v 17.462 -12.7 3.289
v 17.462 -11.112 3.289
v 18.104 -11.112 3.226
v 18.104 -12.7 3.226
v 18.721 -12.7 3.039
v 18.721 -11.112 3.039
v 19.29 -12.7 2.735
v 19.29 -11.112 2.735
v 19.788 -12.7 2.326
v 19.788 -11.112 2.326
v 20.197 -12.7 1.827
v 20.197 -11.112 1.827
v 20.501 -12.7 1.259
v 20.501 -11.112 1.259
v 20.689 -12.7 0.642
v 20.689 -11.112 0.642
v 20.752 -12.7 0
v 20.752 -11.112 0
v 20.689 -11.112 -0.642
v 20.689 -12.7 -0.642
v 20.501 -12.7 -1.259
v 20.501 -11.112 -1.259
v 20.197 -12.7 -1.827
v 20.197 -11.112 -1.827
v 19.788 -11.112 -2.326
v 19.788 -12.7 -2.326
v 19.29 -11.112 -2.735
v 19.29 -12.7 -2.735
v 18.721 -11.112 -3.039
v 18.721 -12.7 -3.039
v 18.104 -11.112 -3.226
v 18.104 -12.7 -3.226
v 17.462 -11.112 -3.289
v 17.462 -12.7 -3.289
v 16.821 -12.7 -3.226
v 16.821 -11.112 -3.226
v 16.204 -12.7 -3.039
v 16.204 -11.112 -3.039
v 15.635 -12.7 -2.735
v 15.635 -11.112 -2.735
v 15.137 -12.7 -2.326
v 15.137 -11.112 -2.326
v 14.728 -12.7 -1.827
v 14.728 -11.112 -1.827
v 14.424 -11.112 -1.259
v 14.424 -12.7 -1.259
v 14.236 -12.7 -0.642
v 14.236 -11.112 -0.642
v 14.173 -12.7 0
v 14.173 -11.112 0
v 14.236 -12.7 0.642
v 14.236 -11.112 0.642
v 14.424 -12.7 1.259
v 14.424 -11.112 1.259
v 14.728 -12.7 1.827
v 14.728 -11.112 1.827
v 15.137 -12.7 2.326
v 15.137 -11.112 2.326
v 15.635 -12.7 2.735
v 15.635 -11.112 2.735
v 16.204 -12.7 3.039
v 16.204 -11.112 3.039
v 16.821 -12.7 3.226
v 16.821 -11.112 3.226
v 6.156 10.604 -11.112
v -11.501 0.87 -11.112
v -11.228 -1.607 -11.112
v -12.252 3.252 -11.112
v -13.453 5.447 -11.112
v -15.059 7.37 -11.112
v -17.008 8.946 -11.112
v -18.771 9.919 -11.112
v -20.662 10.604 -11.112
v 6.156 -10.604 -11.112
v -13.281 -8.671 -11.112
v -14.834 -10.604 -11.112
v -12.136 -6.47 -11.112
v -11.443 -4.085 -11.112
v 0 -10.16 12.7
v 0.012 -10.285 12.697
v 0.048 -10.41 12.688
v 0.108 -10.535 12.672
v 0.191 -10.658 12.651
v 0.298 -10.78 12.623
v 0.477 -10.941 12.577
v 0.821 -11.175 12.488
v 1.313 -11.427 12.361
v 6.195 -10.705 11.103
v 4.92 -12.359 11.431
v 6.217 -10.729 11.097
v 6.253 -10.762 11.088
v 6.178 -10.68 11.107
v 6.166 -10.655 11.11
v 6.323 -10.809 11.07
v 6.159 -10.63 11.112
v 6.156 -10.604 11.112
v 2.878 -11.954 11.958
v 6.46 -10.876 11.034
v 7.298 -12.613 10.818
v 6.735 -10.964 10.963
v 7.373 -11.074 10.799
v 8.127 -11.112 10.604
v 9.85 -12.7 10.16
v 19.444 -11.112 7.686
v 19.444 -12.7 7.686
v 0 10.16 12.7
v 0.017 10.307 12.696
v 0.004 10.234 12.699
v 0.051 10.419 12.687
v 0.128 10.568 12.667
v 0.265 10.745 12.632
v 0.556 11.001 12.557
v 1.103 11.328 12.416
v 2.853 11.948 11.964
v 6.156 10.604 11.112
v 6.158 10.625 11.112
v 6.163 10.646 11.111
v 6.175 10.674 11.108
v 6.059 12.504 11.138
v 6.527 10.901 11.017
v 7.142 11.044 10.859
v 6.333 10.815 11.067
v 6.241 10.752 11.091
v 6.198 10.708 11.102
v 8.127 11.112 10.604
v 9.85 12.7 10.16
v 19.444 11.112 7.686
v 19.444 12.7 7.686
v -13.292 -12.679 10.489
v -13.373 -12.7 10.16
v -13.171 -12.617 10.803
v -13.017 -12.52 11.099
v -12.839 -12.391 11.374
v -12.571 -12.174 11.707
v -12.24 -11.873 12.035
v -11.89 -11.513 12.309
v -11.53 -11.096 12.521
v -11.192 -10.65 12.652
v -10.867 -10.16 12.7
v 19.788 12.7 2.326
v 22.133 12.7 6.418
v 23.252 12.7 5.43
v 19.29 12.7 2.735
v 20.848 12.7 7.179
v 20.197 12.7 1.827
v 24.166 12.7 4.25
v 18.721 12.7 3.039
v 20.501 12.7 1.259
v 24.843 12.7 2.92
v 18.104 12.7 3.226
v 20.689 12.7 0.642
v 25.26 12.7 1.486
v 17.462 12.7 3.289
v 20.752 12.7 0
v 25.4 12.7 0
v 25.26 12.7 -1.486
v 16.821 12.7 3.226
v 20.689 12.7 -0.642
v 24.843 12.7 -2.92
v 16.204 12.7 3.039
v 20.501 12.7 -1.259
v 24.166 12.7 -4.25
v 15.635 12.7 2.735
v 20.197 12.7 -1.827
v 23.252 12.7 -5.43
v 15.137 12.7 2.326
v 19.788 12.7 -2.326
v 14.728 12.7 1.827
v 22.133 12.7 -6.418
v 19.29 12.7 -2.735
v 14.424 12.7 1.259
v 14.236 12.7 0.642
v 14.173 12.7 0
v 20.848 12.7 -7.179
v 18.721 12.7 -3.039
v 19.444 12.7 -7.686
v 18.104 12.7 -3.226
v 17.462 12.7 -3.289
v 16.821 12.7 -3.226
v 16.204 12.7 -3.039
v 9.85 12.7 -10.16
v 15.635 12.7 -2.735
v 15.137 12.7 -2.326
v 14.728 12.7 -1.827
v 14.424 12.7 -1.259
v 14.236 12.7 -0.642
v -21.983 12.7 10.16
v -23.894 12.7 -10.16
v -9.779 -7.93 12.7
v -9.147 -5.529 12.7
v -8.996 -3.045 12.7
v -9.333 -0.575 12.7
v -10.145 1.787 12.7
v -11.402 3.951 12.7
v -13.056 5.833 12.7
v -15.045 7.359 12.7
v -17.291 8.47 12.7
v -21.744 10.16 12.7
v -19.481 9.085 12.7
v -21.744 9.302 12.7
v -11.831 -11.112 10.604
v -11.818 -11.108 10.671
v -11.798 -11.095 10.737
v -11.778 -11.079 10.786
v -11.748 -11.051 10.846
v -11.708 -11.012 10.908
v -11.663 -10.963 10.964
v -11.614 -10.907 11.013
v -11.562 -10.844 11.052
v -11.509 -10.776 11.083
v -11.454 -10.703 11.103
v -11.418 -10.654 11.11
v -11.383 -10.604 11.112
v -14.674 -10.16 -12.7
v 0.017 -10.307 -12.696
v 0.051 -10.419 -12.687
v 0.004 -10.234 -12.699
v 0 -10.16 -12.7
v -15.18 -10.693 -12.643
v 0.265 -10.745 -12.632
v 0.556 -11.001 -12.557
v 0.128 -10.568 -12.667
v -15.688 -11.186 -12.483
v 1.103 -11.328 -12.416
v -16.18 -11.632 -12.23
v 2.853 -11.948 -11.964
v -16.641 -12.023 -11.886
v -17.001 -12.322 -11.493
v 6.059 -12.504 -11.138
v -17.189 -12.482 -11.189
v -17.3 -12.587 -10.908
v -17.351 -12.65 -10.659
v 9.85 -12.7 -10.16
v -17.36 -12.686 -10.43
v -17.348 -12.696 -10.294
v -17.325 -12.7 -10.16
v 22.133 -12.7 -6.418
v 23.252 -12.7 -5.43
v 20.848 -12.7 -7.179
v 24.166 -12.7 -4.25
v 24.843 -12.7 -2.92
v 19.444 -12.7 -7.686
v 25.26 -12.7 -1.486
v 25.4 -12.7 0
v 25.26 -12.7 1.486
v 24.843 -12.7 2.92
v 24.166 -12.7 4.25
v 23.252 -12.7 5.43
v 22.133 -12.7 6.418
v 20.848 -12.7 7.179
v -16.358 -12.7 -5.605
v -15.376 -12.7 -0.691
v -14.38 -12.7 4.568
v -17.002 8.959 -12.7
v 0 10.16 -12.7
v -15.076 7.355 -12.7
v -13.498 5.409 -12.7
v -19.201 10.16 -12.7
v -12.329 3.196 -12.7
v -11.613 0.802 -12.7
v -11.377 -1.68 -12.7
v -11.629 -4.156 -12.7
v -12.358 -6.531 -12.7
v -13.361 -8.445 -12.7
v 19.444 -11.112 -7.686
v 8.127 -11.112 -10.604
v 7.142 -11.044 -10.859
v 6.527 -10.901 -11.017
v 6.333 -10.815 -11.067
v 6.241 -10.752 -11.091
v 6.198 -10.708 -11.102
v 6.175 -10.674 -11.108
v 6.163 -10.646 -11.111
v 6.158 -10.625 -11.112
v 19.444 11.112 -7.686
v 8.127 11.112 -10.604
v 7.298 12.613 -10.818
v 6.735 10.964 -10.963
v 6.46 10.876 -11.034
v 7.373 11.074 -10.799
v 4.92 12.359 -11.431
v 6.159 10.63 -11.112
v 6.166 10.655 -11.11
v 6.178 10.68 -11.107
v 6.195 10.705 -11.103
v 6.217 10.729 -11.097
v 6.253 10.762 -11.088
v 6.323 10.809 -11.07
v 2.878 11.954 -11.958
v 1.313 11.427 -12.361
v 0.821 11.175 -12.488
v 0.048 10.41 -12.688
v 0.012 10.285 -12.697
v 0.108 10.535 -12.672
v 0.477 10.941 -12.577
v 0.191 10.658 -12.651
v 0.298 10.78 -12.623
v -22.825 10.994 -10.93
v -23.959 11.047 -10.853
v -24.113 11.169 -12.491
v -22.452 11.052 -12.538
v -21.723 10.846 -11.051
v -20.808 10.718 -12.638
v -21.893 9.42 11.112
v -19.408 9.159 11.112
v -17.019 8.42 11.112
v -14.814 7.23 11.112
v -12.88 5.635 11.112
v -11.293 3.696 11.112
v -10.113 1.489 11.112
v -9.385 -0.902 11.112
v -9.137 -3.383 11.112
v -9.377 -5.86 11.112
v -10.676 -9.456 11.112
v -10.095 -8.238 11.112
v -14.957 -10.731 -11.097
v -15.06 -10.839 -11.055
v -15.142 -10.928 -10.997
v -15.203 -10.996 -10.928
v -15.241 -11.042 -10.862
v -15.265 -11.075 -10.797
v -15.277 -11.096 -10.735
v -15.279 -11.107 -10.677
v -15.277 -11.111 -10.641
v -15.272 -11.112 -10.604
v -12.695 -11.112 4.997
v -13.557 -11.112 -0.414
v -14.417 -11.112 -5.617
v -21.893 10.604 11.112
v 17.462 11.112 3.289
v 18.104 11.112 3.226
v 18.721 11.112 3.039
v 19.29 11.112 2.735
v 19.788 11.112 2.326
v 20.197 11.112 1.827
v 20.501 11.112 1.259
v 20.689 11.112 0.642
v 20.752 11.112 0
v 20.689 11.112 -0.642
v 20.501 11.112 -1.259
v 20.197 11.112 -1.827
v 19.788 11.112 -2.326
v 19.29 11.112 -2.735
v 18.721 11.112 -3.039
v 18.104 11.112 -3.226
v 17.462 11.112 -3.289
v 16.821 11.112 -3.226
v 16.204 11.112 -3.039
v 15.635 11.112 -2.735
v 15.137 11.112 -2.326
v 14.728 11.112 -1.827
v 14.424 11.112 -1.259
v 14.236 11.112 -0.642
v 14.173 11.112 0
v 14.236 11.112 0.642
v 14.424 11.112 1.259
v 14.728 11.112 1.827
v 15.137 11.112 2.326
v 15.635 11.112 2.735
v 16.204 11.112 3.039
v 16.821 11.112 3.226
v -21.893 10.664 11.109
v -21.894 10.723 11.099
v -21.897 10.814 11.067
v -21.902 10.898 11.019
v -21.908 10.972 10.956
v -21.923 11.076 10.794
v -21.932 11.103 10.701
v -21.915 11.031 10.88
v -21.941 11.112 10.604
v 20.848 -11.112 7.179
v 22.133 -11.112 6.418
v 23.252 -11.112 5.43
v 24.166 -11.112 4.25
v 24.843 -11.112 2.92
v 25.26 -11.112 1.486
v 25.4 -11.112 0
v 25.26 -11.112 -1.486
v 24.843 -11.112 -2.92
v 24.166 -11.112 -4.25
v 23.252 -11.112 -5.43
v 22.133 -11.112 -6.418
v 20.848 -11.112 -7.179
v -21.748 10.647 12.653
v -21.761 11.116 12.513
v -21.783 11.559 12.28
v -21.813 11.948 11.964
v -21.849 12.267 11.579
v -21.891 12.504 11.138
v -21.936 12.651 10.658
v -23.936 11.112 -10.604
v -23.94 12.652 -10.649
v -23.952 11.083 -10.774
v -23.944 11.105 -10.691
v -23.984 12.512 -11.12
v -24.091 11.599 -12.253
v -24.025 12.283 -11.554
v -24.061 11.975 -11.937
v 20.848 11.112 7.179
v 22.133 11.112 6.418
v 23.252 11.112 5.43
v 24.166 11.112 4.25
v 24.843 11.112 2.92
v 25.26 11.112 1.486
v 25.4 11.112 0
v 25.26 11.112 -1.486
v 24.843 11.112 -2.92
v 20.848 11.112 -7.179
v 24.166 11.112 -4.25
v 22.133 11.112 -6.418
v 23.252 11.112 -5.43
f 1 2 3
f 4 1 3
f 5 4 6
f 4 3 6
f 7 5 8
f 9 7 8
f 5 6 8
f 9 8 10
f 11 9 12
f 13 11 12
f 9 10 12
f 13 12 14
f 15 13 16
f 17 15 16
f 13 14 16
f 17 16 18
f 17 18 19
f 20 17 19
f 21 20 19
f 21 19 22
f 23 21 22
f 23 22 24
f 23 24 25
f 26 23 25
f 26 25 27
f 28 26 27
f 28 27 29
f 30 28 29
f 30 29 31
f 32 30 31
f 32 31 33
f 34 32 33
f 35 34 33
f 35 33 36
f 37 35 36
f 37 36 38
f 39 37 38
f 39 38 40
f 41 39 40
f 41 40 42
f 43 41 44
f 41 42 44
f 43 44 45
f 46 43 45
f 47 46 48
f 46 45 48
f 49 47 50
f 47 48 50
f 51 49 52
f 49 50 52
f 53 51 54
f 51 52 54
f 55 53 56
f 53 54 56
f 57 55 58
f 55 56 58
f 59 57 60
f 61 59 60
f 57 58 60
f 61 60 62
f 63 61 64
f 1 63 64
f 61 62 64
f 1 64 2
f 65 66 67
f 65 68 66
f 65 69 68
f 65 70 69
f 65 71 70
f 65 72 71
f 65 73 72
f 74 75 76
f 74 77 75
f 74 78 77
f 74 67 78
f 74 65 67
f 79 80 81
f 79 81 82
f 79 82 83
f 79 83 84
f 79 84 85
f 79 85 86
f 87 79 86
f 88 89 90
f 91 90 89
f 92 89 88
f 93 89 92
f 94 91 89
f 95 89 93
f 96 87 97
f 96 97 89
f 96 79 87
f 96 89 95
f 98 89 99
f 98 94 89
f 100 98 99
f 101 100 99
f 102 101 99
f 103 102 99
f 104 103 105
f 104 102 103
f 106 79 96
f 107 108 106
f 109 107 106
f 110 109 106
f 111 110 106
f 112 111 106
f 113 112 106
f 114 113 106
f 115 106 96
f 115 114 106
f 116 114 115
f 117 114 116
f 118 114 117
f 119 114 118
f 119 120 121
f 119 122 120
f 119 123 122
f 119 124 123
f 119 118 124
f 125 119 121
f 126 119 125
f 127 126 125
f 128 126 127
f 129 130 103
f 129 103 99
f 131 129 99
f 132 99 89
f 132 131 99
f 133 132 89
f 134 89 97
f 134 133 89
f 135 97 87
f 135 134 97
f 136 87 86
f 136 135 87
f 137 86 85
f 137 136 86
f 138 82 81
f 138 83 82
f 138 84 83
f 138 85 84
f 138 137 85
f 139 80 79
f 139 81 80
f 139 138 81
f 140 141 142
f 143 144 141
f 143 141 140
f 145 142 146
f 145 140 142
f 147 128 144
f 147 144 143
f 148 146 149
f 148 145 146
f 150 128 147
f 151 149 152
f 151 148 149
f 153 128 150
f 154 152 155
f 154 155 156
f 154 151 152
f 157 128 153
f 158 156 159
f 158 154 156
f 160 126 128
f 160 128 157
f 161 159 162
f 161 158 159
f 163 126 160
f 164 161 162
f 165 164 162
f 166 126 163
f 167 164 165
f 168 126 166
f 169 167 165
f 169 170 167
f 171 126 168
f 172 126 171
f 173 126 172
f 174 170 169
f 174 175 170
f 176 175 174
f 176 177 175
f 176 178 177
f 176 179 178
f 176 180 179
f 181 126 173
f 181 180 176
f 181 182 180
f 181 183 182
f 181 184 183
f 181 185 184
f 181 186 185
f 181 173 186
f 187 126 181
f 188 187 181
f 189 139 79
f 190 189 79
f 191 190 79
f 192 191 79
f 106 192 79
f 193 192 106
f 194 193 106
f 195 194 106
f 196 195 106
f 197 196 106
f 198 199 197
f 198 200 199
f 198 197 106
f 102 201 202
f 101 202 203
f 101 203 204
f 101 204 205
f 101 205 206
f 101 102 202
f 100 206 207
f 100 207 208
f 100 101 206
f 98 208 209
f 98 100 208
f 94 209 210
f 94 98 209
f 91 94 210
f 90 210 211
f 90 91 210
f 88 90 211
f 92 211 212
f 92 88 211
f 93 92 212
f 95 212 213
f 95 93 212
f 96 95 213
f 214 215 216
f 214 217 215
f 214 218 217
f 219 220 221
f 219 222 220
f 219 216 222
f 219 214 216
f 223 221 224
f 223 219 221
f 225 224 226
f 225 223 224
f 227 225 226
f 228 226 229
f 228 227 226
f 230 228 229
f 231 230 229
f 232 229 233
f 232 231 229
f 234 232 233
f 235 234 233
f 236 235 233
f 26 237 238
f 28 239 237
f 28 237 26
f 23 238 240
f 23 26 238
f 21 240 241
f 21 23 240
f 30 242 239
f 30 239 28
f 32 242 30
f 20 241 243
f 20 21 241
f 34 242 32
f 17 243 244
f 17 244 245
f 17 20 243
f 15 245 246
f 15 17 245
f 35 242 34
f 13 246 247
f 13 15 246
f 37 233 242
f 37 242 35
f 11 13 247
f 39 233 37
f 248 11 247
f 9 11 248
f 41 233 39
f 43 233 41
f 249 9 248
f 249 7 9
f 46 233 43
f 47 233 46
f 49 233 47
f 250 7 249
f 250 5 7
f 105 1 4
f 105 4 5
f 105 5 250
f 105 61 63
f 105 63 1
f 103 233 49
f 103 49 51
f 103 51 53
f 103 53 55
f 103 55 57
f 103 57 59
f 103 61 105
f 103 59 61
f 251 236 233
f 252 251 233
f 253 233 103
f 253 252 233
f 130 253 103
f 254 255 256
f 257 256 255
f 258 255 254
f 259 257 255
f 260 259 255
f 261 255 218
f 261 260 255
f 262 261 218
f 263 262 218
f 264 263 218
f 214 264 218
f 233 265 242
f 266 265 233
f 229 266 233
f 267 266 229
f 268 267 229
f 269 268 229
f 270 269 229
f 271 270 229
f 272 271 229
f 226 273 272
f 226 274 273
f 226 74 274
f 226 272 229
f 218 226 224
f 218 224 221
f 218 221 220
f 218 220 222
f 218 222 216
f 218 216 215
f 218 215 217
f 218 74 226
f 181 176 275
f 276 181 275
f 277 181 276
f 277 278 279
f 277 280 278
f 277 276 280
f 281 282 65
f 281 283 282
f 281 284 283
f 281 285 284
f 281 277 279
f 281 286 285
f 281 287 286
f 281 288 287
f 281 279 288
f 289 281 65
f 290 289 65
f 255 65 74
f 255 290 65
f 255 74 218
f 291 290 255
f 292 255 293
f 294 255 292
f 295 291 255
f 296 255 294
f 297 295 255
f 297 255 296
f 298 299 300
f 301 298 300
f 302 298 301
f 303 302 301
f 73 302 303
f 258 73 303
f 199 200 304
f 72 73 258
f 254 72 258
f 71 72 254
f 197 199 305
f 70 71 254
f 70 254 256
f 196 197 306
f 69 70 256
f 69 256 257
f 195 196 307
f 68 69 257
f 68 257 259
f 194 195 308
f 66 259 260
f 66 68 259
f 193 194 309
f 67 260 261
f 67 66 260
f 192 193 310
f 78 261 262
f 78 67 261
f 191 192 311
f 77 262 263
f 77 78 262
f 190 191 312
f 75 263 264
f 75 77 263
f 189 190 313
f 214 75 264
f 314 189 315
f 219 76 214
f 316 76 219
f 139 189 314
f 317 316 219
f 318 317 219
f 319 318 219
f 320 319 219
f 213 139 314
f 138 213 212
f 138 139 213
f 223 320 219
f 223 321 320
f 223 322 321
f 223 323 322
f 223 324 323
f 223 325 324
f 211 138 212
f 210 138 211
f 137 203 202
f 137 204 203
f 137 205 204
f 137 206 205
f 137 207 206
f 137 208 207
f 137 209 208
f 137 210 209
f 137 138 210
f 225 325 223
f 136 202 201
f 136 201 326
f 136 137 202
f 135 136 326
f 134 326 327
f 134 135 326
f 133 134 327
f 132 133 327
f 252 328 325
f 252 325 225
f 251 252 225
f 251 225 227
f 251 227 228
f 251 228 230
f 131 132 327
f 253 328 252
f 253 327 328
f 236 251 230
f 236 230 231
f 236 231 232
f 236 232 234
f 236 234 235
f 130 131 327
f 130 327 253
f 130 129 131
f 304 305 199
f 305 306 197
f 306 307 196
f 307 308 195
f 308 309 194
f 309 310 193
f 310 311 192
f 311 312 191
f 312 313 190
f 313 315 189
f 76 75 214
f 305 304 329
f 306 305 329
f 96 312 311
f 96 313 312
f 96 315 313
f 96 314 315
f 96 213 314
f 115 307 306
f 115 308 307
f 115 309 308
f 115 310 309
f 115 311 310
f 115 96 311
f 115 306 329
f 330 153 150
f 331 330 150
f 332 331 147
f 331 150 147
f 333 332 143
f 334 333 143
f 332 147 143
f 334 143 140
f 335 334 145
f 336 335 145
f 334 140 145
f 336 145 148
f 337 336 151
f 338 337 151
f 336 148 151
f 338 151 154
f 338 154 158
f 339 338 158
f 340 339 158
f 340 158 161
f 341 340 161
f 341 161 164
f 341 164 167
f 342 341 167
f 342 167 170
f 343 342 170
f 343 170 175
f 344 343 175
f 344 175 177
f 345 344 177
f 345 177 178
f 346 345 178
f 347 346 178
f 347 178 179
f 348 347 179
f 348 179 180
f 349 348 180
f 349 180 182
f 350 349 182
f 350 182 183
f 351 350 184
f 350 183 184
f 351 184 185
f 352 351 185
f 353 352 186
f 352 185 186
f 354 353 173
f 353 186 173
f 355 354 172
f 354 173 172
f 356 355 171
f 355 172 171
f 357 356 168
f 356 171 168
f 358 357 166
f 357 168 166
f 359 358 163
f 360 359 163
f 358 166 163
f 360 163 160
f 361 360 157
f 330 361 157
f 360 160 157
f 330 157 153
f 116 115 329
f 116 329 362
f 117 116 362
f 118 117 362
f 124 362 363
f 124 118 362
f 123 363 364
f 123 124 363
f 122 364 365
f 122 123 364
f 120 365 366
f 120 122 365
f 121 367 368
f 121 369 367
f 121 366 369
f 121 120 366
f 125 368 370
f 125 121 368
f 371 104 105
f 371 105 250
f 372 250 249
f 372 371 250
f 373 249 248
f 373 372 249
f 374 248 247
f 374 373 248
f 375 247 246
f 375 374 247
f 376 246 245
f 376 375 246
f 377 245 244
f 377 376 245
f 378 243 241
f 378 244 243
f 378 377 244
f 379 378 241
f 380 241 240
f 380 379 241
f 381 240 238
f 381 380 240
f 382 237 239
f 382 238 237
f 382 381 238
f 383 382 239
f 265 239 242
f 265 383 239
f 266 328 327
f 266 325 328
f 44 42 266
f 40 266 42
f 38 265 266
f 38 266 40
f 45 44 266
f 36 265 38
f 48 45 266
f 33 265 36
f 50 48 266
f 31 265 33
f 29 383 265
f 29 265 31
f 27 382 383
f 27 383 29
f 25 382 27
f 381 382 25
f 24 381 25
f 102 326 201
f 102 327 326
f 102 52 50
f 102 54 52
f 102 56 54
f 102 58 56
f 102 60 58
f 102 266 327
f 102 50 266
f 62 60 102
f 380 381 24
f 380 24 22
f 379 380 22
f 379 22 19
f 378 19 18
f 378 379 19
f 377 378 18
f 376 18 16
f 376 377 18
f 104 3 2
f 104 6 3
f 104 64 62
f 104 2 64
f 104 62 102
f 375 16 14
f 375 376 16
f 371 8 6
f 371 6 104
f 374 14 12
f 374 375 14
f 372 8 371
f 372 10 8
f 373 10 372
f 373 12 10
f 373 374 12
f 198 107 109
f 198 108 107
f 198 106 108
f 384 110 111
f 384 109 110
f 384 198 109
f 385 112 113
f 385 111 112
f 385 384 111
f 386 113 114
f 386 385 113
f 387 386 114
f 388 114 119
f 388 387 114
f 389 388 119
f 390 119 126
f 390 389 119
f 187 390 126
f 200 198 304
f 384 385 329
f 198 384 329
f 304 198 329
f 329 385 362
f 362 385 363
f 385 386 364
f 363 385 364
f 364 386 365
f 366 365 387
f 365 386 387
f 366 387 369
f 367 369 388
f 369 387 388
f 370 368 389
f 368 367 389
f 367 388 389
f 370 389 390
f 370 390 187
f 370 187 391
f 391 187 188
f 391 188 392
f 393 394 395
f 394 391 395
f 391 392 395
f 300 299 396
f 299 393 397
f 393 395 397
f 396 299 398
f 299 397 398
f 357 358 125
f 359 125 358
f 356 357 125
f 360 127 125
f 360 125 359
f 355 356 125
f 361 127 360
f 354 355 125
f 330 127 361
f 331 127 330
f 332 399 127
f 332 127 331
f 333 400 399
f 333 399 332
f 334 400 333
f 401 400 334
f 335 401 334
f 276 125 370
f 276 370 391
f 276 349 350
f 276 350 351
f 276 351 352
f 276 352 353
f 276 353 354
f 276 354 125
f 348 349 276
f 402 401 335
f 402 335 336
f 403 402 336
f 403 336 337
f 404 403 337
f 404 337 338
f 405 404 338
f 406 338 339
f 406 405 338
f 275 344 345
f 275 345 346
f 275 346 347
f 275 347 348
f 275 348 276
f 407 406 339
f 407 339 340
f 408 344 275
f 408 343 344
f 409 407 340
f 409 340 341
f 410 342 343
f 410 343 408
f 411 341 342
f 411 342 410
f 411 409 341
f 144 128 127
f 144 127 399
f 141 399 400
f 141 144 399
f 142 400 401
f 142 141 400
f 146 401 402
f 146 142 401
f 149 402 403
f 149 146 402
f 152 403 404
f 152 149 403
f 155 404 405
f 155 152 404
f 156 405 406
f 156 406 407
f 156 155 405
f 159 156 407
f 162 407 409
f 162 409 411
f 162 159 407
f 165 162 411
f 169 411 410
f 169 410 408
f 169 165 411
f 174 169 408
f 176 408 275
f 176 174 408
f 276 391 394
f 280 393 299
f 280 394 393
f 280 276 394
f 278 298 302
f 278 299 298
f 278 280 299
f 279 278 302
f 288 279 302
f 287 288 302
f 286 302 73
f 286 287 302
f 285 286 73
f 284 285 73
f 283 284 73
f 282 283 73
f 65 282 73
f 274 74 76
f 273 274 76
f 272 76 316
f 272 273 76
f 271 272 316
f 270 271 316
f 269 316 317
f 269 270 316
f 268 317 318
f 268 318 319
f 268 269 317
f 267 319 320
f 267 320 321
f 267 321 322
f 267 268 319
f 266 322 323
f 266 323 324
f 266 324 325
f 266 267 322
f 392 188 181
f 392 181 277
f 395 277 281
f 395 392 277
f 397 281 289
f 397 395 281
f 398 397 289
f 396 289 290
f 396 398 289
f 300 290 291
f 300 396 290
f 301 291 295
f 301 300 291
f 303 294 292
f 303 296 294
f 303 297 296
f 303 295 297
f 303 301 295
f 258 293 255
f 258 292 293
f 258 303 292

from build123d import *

# Parameters (mm, degrees)
BOSS_EXTRUDE1_DEPTH      = 25.4
BOSS_EXTRUDE1_DEPTH_BACK = 34.925
CUT_EXTRUDE4_DEPTH       = 63.941922635
CUT_EXTRUDE5_DEPTH       = 46.01339384
SKETCH14_R               = 3.2893
CUT_EXTRUDE6_DEPTH       = 46.01339384
CUT_EXTRUDE7_DEPTH       = 56.927898629
CUT_EXTRUDE7_DEPTH_BACK  = 56.927898629
SKETCH15_R               = 12.7
SKETCH17_W               = 59.080455772
SKETCH17_H               = 55.148842709
CUT_EXTRUDE8_DEPTH       = 52.94853237


with BuildPart() as part:
    # Sketch1 → Boss-Extrude1 (new, two sides: drawn at the far end of the back side and taken through both)
    with BuildSketch(Plane(origin=(0, 0, 0), x_dir=(0, 0, -1), z_dir=(1, 0, 0)).offset(-BOSS_EXTRUDE1_DEPTH_BACK)):
        with BuildLine():
            Line((-10.16, 12.7), (10.16, 12.7))
            ThreePointArc((10.16, 12.7), (11.956051224, 11.956051224), (12.7, 10.16))
            Line((12.7, 10.16), (12.7, -10.16))
            ThreePointArc((12.7, -10.16), (11.956051224, -11.956051224), (10.16, -12.7))
            Line((10.16, -12.7), (-10.16, -12.7))
            ThreePointArc((-10.16, -12.7), (-11.956051224, -11.956051224), (-12.7, -10.16))
            Line((-12.7, -10.16), (-12.7, 10.16))
            ThreePointArc((-12.7, 10.16), (-11.956051224, 11.956051224), (-10.16, 12.7))
        make_face()
    extrude(amount=BOSS_EXTRUDE1_DEPTH + BOSS_EXTRUDE1_DEPTH_BACK)

    # Sketch11 → Cut-Extrude4 (cut, through all)
    with BuildSketch(Plane(origin=(25.4, 0, 0), x_dir=(0, 0, -1), z_dir=(1, 0, 0))):
        with BuildLine():
            Line((-10.6045, 11.1125), (10.6045, 11.1125))
            ThreePointArc((10.6045, 11.1125), (10.963710245, 10.963710245), (11.1125, 10.6045))
            Line((11.1125, 10.6045), (11.1125, -10.6045))
            ThreePointArc((11.1125, -10.6045), (10.963710245, -10.963710245), (10.6045, -11.1125))
            Line((10.6045, -11.1125), (-10.6045, -11.1125))
            ThreePointArc((-10.6045, -11.1125), (-10.963710245, -10.963710245), (-11.1125, -10.6045))
            Line((-11.1125, -10.6045), (-11.1125, 10.6045))
            ThreePointArc((-11.1125, 10.6045), (-10.963710245, 10.963710245), (-10.6045, 11.1125))
        make_face()
    extrude(amount=-CUT_EXTRUDE4_DEPTH, mode=Mode.SUBTRACT)

    # Sketch12 → Cut-Extrude5 (cut, through all)
    with BuildSketch(Plane(origin=(0, 12.7, 0), x_dir=(1, 0, 0), z_dir=(0, 1, 0))):
        with BuildLine():
            Line((50.8, 12.7), (0, 12.7))
            Line((0, 12.7), (19.444424463, 7.686083637))
            ThreePointArc((19.444424463, 7.686083637), (25.4, 0), (19.444424463, -7.686083637))
            Line((19.444424463, -7.686083637), (0, -12.7))
            Line((0, -12.7), (50.8, -12.7))
            Line((50.8, -12.7), (50.8, 12.7))
        make_face()
    extrude(amount=-CUT_EXTRUDE5_DEPTH, mode=Mode.SUBTRACT)

    # Sketch14 → Cut-Extrude6 (cut, through all)
    with BuildSketch(Plane(origin=(0, 12.7, 0), x_dir=(1, 0, 0), z_dir=(0, 1, 0))):
        with Locations((17.4625, 0)):
            Circle(SKETCH14_R)
    extrude(amount=-CUT_EXTRUDE6_DEPTH, mode=Mode.SUBTRACT)

    # Sketch15 → Cut-Extrude7 (cut, two sides: drawn at the far end of the back side and taken through both)
    with BuildSketch(Plane(origin=(-21.74366369, -3.432105223, 12.7), x_dir=(-0.9956294808615993, -0.006900458495911936, 0.09313603229582201), z_dir=(-0.09339131029845446, 0.07356465915336342, -0.9929080038374085)).offset(-CUT_EXTRUDE7_DEPTH_BACK)):
        Circle(SKETCH15_R)
    extrude(amount=CUT_EXTRUDE7_DEPTH + CUT_EXTRUDE7_DEPTH_BACK, mode=Mode.SUBTRACT)

    # Sketch17 → Cut-Extrude8 (cut, through all)
    with BuildSketch(Plane(origin=(-22.73705084, 0, 2.138609984), x_dir=(-0.09339131029845445, 0.07356465915336355, -0.9929080038374085), z_dir=(0.9956056474877124, 0, -0.09364504626819836))):
        with Locations((0.199202034, -0.945767637)):
            Rectangle(SKETCH17_W, SKETCH17_H)
    extrude(amount=-CUT_EXTRUDE8_DEPTH, mode=Mode.SUBTRACT)


solid = part.part
